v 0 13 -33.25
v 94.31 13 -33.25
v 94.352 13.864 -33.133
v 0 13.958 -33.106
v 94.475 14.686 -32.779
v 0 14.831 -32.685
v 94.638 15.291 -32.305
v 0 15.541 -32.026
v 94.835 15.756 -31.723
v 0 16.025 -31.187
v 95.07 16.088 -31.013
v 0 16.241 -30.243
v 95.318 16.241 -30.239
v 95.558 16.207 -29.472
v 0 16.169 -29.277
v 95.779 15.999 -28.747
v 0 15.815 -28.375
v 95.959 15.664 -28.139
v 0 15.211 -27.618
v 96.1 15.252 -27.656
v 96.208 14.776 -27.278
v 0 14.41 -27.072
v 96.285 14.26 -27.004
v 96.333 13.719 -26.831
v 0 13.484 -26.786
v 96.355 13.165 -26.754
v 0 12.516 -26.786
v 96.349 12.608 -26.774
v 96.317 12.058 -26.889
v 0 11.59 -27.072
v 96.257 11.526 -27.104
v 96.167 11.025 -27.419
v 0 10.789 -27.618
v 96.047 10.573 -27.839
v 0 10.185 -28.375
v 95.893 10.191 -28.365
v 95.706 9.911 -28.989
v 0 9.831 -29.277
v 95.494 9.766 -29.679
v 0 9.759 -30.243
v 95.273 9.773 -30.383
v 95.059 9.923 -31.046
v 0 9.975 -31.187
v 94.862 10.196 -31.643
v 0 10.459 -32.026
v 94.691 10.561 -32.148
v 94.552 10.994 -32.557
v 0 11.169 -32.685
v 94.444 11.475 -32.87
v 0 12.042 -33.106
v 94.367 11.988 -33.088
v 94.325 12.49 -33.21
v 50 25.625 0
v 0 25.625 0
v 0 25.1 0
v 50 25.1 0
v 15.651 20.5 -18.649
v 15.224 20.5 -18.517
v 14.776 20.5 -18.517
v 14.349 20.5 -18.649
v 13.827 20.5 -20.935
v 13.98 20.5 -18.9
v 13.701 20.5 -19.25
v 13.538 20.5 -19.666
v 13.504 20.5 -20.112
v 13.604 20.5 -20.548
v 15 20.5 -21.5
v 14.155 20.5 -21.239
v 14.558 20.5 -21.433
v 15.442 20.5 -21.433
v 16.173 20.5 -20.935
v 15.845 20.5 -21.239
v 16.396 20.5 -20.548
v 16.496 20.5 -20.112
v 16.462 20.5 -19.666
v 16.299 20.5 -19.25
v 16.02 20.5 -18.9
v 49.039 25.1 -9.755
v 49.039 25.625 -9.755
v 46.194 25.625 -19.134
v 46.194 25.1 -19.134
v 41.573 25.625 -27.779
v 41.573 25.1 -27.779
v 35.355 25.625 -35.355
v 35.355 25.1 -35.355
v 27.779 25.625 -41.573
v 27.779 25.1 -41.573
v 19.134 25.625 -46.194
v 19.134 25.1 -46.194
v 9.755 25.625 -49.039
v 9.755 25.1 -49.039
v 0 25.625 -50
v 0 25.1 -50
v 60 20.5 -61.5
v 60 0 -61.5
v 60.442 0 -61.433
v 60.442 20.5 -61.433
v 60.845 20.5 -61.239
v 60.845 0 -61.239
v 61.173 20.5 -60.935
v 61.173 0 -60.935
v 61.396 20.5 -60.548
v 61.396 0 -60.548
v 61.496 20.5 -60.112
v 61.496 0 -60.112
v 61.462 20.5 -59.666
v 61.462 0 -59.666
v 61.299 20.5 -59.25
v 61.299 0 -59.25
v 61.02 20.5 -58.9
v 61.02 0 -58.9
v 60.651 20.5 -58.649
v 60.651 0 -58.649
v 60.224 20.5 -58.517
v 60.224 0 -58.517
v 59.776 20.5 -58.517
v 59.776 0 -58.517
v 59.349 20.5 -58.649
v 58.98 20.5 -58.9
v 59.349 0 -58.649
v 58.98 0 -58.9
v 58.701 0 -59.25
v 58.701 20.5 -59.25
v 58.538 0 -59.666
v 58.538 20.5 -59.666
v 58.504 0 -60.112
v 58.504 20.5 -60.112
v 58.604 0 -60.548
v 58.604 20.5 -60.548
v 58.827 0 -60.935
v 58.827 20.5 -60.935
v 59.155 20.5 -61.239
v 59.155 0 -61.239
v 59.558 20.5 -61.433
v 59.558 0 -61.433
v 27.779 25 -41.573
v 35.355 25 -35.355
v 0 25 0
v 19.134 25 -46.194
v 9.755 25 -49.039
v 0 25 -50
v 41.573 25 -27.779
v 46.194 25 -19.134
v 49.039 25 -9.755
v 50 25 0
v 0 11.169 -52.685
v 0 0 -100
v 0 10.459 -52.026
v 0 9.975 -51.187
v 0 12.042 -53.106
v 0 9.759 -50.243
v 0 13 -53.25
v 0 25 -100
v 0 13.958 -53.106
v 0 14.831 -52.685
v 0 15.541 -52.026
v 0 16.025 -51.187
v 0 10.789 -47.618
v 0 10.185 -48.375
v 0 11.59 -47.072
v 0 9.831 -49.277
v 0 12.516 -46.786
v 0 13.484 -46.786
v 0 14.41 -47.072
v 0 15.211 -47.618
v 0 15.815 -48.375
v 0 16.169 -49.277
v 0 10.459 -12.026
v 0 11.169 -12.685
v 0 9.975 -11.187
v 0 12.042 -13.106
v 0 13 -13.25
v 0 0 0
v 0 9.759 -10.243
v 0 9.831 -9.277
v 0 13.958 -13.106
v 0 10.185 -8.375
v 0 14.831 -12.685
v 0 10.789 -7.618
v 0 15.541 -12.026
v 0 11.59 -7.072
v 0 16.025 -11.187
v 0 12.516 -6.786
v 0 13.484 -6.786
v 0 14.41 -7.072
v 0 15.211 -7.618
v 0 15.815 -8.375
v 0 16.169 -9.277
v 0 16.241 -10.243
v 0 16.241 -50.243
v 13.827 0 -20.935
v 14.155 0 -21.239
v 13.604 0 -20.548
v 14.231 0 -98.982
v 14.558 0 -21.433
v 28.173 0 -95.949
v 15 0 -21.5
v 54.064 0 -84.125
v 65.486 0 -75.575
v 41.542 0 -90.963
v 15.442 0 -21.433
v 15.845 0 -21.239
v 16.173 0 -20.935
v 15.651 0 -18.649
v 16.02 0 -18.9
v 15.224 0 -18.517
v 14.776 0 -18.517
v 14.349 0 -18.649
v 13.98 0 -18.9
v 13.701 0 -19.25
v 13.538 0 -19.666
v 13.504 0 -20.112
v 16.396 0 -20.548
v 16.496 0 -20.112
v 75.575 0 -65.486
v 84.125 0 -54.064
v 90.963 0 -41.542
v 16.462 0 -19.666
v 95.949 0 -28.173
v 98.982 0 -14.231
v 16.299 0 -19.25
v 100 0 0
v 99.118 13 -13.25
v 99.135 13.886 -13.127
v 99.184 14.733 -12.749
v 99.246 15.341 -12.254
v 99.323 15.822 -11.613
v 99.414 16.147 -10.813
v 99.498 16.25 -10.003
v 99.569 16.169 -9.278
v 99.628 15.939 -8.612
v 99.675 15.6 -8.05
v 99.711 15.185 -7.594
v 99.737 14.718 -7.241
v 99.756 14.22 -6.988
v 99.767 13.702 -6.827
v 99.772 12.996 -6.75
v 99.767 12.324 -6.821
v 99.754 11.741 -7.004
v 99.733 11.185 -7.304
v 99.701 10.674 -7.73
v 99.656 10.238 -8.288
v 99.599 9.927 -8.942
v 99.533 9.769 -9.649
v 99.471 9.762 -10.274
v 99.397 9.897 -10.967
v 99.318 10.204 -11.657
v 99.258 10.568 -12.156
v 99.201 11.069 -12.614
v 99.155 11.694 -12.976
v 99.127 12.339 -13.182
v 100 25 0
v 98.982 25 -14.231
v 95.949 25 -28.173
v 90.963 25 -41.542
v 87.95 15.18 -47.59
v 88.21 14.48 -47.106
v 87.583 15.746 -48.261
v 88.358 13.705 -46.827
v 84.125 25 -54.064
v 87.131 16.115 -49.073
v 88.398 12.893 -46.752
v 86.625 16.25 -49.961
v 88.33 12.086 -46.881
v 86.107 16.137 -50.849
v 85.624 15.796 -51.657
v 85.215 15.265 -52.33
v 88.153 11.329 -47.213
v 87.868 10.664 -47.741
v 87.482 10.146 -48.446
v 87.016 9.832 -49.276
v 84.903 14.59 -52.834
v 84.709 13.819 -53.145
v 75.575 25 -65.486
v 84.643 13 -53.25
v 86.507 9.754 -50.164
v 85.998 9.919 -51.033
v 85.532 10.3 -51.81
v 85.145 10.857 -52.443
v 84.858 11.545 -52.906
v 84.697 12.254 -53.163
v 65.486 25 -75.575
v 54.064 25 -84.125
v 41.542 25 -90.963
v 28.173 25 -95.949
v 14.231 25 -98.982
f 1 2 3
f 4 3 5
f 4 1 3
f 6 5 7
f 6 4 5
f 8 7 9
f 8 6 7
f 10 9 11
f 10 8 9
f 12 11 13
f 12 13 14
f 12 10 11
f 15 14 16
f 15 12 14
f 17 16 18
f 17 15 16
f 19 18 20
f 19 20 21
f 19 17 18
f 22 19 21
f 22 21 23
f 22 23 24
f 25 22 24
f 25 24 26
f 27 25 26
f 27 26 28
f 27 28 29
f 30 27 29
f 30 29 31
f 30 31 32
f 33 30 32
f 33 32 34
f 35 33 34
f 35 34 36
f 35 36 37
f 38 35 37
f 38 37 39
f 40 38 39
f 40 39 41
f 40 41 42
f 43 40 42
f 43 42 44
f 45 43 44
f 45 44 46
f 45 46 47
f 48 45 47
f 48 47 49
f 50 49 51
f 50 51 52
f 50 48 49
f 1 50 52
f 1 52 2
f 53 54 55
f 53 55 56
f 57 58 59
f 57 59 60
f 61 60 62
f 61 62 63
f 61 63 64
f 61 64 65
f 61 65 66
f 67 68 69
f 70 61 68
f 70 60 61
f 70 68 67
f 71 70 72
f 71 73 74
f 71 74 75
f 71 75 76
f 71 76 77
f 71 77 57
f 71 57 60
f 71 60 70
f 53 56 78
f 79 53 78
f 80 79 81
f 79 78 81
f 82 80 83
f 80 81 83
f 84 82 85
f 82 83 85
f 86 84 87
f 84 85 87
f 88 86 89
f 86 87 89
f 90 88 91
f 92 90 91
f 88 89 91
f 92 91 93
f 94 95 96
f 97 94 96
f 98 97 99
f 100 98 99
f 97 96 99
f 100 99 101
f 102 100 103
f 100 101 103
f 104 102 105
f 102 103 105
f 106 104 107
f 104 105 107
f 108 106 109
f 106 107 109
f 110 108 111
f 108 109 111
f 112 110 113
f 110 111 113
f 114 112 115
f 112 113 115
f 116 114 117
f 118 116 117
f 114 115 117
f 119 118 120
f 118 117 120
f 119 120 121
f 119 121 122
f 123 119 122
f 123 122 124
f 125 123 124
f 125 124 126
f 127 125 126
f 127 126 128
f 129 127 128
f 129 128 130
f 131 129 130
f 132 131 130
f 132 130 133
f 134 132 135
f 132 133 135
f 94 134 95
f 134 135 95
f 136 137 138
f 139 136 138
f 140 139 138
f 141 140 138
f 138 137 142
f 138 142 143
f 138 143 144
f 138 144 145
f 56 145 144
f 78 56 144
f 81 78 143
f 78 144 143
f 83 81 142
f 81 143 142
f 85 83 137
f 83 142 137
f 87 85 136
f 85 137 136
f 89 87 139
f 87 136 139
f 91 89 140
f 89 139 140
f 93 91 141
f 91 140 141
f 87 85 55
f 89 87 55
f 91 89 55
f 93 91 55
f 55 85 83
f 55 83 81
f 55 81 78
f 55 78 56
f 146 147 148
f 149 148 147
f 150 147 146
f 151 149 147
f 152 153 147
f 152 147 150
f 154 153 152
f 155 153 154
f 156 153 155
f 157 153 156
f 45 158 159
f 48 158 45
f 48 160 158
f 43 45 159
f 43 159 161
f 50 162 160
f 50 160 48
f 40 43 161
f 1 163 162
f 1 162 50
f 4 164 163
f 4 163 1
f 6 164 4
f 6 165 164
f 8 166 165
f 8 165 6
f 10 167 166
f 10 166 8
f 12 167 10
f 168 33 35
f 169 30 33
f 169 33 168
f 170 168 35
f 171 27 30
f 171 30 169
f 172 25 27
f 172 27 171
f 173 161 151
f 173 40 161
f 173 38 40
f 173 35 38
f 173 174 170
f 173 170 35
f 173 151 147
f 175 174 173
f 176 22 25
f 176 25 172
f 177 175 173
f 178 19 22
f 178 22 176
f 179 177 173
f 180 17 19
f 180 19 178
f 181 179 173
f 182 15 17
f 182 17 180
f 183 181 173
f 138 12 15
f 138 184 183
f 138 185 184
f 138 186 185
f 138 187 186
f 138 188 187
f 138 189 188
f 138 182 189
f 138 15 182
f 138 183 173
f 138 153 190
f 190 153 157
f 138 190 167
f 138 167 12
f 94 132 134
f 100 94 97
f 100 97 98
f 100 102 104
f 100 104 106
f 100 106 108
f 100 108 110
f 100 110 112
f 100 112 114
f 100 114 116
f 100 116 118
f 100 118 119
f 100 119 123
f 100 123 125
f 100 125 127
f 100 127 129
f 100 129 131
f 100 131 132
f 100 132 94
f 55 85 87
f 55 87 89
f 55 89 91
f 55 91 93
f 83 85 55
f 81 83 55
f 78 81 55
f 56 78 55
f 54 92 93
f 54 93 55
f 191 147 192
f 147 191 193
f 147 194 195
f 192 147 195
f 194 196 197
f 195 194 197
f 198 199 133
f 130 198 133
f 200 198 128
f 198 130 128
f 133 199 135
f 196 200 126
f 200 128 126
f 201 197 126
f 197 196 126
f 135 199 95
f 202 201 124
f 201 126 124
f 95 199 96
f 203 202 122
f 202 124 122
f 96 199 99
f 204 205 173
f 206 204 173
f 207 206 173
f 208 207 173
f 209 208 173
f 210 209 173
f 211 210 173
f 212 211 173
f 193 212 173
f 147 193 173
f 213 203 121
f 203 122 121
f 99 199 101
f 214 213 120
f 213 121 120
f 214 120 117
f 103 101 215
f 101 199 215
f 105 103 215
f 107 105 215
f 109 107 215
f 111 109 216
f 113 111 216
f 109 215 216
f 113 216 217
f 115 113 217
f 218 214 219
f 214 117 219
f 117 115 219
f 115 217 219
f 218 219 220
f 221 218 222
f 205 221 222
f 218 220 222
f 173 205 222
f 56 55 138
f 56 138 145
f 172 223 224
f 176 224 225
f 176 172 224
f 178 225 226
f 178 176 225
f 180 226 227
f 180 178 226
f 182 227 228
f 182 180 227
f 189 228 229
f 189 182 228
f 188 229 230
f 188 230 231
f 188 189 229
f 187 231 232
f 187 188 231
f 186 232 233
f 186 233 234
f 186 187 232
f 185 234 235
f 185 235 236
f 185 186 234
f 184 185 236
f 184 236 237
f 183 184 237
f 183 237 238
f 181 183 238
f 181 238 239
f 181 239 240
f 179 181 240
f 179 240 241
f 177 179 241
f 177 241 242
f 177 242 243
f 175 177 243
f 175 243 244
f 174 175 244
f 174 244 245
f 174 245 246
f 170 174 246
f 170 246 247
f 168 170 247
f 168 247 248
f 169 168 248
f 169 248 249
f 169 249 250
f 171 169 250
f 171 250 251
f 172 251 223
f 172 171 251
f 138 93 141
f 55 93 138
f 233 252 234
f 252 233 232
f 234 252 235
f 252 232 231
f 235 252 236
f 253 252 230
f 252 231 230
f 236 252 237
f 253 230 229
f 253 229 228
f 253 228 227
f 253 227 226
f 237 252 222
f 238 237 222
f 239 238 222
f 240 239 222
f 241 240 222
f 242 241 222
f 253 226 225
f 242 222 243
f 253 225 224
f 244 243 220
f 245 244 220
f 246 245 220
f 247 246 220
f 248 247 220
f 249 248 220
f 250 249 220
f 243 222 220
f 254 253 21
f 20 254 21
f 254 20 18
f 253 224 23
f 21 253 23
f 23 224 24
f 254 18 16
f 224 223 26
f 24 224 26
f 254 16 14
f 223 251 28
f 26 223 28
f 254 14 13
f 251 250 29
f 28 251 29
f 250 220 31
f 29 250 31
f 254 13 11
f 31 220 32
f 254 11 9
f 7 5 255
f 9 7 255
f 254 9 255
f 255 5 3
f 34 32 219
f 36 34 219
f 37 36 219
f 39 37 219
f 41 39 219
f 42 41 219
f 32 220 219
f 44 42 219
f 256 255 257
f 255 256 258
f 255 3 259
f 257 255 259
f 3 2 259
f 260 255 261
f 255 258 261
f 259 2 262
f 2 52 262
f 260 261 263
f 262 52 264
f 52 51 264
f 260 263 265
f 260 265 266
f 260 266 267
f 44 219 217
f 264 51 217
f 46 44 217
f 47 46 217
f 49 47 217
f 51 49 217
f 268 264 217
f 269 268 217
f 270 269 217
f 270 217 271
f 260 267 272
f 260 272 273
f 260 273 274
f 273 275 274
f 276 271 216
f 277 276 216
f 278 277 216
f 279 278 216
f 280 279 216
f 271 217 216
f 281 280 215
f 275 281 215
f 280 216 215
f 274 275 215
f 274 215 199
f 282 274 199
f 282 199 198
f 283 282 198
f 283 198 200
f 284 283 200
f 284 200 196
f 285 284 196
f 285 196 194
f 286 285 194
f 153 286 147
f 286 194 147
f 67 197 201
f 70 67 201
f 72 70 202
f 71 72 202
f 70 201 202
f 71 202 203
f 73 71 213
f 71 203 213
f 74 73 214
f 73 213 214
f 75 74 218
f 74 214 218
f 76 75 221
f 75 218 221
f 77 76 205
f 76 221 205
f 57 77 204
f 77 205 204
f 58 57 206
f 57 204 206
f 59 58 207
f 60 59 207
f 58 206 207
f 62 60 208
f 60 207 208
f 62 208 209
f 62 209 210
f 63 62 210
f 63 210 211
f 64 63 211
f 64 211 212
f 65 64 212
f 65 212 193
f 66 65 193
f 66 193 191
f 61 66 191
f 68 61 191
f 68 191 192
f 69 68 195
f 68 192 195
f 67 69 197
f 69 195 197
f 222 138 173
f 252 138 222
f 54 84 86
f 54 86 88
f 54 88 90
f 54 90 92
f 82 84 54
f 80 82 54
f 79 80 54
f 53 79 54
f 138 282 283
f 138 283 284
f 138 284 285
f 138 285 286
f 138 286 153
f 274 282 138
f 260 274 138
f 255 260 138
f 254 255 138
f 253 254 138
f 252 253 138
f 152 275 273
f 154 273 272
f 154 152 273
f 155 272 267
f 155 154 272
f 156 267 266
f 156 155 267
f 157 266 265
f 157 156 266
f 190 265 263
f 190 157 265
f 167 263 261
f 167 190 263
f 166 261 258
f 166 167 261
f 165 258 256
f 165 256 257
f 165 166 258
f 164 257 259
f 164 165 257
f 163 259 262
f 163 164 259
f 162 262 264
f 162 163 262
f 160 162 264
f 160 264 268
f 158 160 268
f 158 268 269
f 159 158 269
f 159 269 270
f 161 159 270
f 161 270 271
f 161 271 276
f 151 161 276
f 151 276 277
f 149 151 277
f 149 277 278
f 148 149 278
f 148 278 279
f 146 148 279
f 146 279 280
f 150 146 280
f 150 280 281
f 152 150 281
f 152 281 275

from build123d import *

# Parameters (mm, degrees)
SKETCH1_R               = 100
BOSS_EXTRUDE1_DEPTH     = 25
SKETCH2_R               = 50
BOSS_EXTRUDE2_DEPTH     = 0.1
SKETCH4_R               = 50
BOSS_EXTRUDE3_DEPTH     = 0.525
CUT_EXTRUDE1_DEPTH      = 144.724182464
CUT_EXTRUDE1_DEPTH_BACK = 144.724182464
SKETCH5_R               = 3.25
SKETCH6_R               = 1.5
CUT_EXTRUDE3_DEPTH      = 20.5
CUT_EXTRUDE4_DEPTH      = 144.724182603
CUT_EXTRUDE4_DEPTH_BACK = 144.724182603
SKETCH8_OUTSIDE_W       = 258.8
SKETCH8_OUTSIDE_H       = 258.8
SKETCH8_OUTSIDE_W_2     = 122.671800347
SKETCH8_OUTSIDE_H_2     = 113.648228552


with BuildPart() as part:
    # Sketch1 → Boss-Extrude1 (new body)
    with BuildSketch(Plane(origin=(0, 0, 0), x_dir=(1, 0, 0), z_dir=(0, 1, 0))):
        with Locations(Location((0, 0, 0), (0, 0, 270))):
            Circle(SKETCH1_R)
    extrude(amount=BOSS_EXTRUDE1_DEPTH)

    # Sketch5 → Cut-Extrude1 (cut, two sides: drawn at the far end of the back side and taken through both)
    with BuildSketch(Plane(origin=(0, 0, 0), x_dir=(0, 0, -1), z_dir=(1, 0, 0)).offset(-CUT_EXTRUDE1_DEPTH_BACK)):
        with Locations((10, 13)):
            Circle(SKETCH5_R)
        with Locations((30, 13)):
            Circle(SKETCH5_R)
        with Locations((50, 13)):
            Circle(SKETCH5_R)
    extrude(amount=CUT_EXTRUDE1_DEPTH + CUT_EXTRUDE1_DEPTH_BACK, mode=Mode.SUBTRACT)

    # Sketch6 → Cut-Extrude3 (cut)
    with BuildSketch(Plane.XZ):
        with Locations(Location((15, -20, 0), (0, 0, 270))):
            Circle(SKETCH6_R)
        with Locations(Location((60, -60, 0), (0, 0, 270))):
            Circle(SKETCH6_R)
    extrude(amount=-CUT_EXTRUDE3_DEPTH, mode=Mode.SUBTRACT)


with BuildPart() as body_2:
    # Sketch2 → Boss-Extrude2 (new body)
    with BuildSketch(Plane(origin=(0, 25, 0), x_dir=(1, 0, 0), z_dir=(0, 1, 0))):
        with Locations(Location((0, 0, 0), (0, 0, 270))):
            Circle(SKETCH2_R)
    extrude(amount=BOSS_EXTRUDE2_DEPTH)


with BuildPart() as body_3:
    # Sketch4 → Boss-Extrude3 (new body)
    with BuildSketch(Plane(origin=(0, 25.1, 0), x_dir=(1, 0, 0), z_dir=(0, 1, 0))):
        with Locations(Location((0, 0, 0), (0, 0, 270))):
            Circle(SKETCH4_R)
    extrude(amount=BOSS_EXTRUDE3_DEPTH)


with BuildPart() as cut_extrude4_tool:
    # Sketch8 outside → Cut-Extrude4 (new, two sides: drawn at the far end of the back side and taken through both)
    with BuildSketch(Plane.XZ.offset(-CUT_EXTRUDE4_DEPTH_BACK)):
        Rectangle(SKETCH8_OUTSIDE_W, SKETCH8_OUTSIDE_H)
        with Locations((61.335900174, -56.824114276)):
            Rectangle(SKETCH8_OUTSIDE_W_2, SKETCH8_OUTSIDE_H_2, mode=Mode.SUBTRACT)
    extrude(amount=CUT_EXTRUDE4_DEPTH + CUT_EXTRUDE4_DEPTH_BACK)


with BuildPart() as part_1:
    add(part.part)

    # Cut-Extrude4: cut by cut_extrude4_tool
    add(cut_extrude4_tool.part, mode=Mode.SUBTRACT)


with BuildPart() as body_2_1:
    add(body_2.part)

    # Cut-Extrude4: cut by cut_extrude4_tool
    add(cut_extrude4_tool.part, mode=Mode.SUBTRACT)


with BuildPart() as body_3_1:
    add(body_3.part)

    # Cut-Extrude4: cut by cut_extrude4_tool
    add(cut_extrude4_tool.part, mode=Mode.SUBTRACT)


solid = Compound([part_1.part, body_2_1.part, body_3_1.part])
